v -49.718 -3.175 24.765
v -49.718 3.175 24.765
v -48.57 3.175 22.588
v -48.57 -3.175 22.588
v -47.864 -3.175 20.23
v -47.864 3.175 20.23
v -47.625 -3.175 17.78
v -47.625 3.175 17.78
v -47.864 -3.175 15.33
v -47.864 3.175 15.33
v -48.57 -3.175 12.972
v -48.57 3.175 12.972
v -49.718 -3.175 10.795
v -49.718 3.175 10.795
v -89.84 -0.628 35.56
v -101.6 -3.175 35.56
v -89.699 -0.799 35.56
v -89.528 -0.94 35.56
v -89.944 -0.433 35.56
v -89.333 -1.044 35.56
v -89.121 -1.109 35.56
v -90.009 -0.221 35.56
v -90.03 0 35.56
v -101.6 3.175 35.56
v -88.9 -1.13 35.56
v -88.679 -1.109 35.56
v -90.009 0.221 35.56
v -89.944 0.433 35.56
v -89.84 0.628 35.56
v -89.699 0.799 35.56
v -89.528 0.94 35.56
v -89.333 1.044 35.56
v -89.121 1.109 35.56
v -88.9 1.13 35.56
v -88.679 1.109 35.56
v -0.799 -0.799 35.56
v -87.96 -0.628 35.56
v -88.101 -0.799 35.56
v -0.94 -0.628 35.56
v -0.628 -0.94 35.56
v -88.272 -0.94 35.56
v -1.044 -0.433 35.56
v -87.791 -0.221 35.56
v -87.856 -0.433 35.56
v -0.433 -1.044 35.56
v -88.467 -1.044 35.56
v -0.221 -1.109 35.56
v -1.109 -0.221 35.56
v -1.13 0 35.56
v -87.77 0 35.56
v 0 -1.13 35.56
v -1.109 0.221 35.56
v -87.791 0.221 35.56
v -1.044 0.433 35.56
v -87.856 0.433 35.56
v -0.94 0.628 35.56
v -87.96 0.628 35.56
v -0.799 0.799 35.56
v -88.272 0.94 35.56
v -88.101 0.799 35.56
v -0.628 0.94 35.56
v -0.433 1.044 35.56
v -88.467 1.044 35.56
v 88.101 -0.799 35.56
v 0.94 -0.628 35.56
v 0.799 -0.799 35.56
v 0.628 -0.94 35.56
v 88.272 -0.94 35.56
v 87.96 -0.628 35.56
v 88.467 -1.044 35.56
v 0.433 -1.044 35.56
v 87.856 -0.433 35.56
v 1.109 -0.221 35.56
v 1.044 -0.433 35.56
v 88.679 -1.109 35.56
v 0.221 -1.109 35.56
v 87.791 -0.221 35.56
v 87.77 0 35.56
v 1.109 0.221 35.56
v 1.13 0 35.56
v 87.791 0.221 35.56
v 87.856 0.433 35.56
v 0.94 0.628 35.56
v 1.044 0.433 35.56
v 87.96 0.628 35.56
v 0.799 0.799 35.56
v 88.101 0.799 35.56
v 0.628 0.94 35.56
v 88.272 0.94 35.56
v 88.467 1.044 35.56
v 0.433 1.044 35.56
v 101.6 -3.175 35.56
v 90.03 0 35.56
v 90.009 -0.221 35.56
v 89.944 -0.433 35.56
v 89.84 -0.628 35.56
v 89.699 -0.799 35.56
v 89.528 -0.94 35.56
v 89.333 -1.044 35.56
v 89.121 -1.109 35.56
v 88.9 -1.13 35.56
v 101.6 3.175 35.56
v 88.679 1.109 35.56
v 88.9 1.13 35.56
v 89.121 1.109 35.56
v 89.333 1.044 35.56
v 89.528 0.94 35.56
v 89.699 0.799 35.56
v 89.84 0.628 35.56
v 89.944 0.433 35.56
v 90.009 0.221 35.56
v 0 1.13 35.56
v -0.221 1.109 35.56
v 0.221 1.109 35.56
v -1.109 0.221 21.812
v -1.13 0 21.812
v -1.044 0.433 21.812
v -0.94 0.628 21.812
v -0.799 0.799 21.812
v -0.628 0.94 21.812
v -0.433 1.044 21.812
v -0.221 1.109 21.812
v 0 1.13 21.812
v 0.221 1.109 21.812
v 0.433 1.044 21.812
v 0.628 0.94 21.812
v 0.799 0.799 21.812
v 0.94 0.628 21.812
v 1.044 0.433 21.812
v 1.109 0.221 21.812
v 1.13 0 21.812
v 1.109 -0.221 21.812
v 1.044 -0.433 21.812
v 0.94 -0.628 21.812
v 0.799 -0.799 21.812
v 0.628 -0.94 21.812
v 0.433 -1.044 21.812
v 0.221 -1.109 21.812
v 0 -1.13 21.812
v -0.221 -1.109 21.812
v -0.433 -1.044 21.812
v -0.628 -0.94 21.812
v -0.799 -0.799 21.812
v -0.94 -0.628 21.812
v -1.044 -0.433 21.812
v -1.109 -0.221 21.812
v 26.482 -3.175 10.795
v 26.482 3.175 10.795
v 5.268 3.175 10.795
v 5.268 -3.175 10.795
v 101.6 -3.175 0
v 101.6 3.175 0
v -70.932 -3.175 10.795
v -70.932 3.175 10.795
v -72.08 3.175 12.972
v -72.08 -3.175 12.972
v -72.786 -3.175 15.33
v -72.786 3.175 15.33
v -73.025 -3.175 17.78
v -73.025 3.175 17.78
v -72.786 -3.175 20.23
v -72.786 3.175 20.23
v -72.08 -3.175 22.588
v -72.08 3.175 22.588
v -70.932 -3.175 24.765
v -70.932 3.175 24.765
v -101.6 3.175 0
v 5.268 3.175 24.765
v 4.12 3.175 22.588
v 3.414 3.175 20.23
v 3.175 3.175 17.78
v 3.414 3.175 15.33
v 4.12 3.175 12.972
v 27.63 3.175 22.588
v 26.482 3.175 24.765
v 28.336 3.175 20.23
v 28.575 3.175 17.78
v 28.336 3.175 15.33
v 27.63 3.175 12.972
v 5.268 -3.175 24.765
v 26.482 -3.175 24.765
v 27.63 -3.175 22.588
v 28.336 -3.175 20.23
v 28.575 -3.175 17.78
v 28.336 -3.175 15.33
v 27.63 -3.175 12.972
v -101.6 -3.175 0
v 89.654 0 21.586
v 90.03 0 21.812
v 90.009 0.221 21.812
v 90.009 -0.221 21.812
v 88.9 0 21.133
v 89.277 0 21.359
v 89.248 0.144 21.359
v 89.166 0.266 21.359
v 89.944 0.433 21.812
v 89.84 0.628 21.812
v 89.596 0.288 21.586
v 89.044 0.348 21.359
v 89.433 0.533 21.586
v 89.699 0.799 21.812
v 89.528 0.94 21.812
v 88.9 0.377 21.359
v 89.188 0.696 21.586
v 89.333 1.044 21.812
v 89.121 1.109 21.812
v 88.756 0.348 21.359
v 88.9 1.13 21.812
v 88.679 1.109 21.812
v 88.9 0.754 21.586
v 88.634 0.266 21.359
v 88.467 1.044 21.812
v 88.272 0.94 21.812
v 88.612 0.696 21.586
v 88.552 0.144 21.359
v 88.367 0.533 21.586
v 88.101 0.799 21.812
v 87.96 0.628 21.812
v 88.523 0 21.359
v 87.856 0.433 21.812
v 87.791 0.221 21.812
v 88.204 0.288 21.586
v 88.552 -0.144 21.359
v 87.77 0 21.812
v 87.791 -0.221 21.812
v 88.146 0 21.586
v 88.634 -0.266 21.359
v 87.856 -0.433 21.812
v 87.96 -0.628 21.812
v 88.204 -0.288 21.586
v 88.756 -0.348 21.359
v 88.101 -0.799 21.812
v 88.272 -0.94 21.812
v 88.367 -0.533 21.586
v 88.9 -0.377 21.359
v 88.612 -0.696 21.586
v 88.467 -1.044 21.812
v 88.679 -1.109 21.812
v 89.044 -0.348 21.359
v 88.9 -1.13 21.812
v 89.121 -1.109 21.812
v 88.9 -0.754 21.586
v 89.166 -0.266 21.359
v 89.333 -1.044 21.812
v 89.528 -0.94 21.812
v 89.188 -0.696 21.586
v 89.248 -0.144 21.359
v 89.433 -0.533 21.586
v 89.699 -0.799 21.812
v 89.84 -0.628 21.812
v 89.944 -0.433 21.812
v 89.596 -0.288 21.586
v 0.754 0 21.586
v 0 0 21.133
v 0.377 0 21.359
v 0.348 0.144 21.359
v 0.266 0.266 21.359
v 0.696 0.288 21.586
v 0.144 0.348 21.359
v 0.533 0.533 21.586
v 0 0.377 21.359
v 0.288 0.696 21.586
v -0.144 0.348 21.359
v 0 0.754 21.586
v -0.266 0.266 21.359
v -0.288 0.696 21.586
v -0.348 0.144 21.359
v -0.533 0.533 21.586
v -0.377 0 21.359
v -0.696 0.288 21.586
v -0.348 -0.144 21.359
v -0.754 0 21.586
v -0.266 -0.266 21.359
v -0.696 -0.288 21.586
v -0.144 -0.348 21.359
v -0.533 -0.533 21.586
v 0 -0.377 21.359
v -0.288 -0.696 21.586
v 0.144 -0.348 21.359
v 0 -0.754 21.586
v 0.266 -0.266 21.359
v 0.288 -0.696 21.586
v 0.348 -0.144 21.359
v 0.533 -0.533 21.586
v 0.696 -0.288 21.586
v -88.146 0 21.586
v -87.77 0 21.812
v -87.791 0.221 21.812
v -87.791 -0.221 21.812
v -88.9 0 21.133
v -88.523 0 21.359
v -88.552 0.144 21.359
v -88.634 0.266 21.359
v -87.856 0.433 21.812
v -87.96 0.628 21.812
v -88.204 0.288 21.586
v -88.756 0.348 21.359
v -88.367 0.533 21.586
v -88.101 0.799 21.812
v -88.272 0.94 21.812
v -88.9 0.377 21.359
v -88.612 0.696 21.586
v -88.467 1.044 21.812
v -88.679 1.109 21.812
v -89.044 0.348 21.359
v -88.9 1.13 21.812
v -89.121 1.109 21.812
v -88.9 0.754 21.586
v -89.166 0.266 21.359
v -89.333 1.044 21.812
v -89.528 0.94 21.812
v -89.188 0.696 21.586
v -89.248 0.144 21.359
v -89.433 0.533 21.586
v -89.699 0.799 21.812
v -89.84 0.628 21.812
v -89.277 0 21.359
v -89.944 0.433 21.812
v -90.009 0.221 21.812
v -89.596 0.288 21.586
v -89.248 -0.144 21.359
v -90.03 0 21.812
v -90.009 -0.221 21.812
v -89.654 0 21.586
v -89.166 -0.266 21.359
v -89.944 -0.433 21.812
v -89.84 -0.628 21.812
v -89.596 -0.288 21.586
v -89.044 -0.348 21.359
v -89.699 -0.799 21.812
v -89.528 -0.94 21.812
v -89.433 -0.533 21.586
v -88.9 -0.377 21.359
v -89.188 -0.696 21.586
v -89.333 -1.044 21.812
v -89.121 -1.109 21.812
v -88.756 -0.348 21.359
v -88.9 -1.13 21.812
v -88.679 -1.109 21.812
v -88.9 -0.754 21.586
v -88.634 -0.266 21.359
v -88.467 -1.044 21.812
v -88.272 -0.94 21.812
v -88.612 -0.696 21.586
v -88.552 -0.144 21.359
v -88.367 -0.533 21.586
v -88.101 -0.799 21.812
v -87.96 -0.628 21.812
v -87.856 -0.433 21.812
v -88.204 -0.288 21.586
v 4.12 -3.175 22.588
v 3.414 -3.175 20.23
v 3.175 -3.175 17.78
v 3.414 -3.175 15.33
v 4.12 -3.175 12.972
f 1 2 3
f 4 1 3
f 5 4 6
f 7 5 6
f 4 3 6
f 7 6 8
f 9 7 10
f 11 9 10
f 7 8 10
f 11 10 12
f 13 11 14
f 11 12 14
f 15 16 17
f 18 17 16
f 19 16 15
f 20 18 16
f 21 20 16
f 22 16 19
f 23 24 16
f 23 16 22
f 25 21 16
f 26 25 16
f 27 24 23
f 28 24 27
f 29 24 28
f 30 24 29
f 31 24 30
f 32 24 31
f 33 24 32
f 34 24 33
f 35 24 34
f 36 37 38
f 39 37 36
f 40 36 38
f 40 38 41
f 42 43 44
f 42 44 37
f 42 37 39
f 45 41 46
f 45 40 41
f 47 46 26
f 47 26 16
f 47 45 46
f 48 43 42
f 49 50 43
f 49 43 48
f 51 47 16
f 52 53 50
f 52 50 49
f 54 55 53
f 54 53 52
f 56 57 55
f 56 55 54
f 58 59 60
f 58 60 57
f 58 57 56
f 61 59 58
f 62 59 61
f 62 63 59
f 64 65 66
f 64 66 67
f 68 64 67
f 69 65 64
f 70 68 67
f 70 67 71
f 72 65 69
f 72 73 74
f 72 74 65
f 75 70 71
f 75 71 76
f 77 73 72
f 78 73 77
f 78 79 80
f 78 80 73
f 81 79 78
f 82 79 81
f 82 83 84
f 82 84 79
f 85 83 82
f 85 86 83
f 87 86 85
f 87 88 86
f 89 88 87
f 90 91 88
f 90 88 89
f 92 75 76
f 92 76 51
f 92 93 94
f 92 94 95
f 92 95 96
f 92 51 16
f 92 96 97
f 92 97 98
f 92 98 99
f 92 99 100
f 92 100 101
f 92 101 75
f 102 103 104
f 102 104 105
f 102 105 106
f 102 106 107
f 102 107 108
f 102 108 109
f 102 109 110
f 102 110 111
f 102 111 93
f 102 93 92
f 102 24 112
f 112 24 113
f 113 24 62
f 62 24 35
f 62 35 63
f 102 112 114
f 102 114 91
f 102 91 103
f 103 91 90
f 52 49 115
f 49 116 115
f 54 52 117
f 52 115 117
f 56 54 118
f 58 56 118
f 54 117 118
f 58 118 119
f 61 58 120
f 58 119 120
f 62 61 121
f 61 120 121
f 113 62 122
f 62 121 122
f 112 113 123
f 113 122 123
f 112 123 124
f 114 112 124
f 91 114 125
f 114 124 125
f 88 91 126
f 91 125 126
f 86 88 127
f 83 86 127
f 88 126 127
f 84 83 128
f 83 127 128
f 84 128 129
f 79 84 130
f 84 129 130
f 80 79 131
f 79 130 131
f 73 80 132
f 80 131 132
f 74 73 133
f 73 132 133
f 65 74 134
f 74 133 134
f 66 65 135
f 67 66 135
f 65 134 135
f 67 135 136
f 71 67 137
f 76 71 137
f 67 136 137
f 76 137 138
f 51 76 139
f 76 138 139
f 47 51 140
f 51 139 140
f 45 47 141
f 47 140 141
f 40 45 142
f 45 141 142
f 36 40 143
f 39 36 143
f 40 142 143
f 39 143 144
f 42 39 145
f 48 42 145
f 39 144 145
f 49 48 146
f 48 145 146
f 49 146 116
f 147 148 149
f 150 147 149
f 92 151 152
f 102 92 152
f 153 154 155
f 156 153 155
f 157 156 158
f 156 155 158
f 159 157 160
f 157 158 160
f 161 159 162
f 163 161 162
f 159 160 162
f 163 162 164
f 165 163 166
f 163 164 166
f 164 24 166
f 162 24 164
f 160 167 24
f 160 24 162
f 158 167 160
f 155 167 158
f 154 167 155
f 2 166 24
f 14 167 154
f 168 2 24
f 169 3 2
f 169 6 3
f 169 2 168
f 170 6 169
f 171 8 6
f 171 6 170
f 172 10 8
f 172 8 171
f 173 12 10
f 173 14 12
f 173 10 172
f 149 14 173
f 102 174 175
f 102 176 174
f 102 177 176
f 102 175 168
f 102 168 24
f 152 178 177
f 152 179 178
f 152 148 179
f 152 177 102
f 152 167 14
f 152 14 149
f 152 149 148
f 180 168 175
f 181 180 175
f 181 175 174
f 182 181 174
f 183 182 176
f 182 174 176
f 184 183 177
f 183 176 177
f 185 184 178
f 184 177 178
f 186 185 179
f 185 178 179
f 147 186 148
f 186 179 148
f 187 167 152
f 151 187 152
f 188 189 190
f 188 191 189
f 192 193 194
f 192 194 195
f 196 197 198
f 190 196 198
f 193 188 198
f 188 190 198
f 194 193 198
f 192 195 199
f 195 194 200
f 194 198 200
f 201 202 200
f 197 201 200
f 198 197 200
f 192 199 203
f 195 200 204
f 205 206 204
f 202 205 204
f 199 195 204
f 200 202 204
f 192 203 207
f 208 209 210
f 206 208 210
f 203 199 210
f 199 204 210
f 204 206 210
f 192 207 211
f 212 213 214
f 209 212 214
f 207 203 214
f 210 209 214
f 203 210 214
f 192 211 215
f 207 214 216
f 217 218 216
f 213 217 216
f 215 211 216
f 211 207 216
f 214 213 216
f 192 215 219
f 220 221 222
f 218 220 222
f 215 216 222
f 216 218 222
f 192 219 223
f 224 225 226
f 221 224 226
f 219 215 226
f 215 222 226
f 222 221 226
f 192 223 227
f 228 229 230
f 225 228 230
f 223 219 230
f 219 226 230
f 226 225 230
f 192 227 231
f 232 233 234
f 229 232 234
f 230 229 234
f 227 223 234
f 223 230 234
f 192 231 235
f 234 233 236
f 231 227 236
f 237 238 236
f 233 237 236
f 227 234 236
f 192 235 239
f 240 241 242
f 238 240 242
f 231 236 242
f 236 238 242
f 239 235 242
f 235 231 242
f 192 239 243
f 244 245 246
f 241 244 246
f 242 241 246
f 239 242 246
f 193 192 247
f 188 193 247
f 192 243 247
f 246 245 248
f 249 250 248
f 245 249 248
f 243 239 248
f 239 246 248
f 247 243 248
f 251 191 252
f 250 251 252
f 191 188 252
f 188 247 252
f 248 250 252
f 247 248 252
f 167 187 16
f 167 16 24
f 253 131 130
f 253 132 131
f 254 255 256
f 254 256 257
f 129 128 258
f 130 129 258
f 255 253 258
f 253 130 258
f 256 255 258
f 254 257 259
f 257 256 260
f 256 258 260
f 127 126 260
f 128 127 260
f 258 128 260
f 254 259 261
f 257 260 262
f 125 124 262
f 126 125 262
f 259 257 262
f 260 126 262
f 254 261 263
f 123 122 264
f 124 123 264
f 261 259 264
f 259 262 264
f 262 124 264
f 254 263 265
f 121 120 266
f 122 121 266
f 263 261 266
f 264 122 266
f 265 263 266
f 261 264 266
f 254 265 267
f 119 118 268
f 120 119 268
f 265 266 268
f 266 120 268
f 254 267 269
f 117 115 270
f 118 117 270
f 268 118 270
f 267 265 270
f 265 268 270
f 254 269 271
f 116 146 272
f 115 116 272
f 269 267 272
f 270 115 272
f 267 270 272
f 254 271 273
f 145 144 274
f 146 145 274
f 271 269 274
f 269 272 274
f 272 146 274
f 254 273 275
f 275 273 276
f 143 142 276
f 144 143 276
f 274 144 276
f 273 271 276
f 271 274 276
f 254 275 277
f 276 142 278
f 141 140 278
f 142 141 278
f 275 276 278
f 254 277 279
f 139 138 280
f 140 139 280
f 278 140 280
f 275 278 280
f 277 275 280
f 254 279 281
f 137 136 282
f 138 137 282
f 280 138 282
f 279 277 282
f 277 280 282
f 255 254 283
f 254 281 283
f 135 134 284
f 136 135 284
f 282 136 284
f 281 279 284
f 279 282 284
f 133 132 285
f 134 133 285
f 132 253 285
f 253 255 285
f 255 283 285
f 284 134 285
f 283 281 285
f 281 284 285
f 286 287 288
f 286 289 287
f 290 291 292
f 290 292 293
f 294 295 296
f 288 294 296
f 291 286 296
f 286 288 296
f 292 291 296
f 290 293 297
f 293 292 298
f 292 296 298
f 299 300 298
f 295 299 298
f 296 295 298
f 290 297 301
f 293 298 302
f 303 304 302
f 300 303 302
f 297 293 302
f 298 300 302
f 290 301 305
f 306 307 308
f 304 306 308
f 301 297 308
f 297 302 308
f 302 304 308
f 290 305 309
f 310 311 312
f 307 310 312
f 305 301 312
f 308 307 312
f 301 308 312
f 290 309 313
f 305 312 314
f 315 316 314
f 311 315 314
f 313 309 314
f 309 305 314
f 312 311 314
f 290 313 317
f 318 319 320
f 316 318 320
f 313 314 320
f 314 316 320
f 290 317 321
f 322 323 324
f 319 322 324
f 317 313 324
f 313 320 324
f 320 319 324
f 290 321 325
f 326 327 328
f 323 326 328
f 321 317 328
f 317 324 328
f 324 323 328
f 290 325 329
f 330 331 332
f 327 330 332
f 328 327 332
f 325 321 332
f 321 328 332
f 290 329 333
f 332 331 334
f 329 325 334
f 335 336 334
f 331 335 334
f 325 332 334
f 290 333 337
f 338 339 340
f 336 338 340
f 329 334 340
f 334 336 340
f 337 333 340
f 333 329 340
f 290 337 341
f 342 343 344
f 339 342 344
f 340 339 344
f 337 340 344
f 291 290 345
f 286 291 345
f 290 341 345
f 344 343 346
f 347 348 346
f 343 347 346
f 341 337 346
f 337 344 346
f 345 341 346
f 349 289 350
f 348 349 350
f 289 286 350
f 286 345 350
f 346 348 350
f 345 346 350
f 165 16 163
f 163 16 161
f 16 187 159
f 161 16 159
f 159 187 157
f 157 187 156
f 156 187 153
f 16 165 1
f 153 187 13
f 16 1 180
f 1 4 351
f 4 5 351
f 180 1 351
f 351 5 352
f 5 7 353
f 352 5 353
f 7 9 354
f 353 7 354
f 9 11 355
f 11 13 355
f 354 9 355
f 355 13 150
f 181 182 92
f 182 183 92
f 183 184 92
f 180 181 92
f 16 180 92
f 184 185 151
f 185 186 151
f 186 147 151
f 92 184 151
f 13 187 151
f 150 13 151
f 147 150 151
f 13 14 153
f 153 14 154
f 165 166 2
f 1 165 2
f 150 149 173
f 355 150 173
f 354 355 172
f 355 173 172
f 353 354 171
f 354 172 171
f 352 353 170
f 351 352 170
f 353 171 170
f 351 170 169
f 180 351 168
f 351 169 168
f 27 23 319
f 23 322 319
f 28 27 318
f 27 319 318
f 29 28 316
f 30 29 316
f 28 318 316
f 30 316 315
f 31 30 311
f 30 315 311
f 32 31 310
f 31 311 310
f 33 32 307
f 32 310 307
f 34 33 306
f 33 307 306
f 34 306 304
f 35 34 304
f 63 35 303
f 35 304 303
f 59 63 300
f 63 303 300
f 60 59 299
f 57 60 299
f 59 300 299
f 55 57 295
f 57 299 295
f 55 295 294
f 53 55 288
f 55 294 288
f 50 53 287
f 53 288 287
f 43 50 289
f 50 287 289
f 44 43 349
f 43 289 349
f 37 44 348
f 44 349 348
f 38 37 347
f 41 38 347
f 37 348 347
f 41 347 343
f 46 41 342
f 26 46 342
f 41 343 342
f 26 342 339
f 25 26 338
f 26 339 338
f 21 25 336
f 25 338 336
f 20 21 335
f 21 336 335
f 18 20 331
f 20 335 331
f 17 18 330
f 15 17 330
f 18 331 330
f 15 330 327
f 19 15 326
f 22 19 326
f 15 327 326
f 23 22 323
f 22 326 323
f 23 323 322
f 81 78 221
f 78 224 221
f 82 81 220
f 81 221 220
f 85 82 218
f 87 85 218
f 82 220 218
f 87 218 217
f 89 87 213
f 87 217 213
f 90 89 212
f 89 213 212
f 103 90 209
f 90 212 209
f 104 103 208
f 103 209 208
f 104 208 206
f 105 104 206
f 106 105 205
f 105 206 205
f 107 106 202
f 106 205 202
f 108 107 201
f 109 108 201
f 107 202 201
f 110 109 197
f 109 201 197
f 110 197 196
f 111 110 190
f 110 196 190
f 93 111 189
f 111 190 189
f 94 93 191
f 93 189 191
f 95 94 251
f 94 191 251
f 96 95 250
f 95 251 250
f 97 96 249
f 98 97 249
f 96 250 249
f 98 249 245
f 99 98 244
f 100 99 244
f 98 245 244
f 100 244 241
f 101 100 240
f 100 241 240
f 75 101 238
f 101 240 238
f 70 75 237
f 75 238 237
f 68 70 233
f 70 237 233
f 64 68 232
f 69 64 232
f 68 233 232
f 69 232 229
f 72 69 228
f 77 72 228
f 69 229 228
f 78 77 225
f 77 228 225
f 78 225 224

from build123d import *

# Parameters (mm, degrees)
F0_W     = 203.2
F0_H     = 6.35
F1_DEPTH = 35.56
F3_D     = 2.2606
F3_DEPTH = 13.74775
F3_TIP   = 0.6791527577
F5_DEPTH = 6.351


with BuildPart() as f1:
    # F0 (on Top) → F1 (new body)
    with BuildSketch(Plane.XY):
        Rectangle(F0_W, F0_H)
    extrude(amount=F1_DEPTH)

    # F3
    with Locations(Plane.XY.offset(35.56)):
        with Locations((0, 0), (88.9, 0), (-88.9, 0)):
            Hole(F3_D / 2, depth=F3_DEPTH)
            with Locations((0, 0, -(F3_DEPTH + F3_TIP / 2))):  # 118° drill point
                Cone(0, F3_D / 2, F3_TIP, mode=Mode.SUBTRACT)

    # F4 (on face) → F5 (cut, through all)
    with BuildSketch(Plane(origin=(0, 3.175, 0), x_dir=(-1, 0, 0), z_dir=(0, 1, 0))):
        with BuildLine():
            Line((70.9315911112, 24.765), (49.7184088888, 24.765))
            ThreePointArc((49.7184088888, 24.765), (47.625, 17.78), (49.7184088888, 10.795))
            Line((49.7184088888, 10.795), (70.9315911112, 10.795))
            ThreePointArc((70.9315911112, 10.795), (73.025, 17.78), (70.9315911112, 24.765))
        make_face()
        with BuildLine():
            Line((-26.4815911112, 10.795), (-5.2684088888, 10.795))
            ThreePointArc((-5.2684088888, 10.795), (-3.175, 17.78), (-5.2684088888, 24.765))
            Line((-5.2684088888, 24.765), (-26.4815911112, 24.765))
            ThreePointArc((-26.4815911112, 24.765), (-28.575, 17.78), (-26.4815911112, 10.795))
        make_face()
    extrude(amount=-F5_DEPTH, mode=Mode.SUBTRACT)


solid = f1.part
